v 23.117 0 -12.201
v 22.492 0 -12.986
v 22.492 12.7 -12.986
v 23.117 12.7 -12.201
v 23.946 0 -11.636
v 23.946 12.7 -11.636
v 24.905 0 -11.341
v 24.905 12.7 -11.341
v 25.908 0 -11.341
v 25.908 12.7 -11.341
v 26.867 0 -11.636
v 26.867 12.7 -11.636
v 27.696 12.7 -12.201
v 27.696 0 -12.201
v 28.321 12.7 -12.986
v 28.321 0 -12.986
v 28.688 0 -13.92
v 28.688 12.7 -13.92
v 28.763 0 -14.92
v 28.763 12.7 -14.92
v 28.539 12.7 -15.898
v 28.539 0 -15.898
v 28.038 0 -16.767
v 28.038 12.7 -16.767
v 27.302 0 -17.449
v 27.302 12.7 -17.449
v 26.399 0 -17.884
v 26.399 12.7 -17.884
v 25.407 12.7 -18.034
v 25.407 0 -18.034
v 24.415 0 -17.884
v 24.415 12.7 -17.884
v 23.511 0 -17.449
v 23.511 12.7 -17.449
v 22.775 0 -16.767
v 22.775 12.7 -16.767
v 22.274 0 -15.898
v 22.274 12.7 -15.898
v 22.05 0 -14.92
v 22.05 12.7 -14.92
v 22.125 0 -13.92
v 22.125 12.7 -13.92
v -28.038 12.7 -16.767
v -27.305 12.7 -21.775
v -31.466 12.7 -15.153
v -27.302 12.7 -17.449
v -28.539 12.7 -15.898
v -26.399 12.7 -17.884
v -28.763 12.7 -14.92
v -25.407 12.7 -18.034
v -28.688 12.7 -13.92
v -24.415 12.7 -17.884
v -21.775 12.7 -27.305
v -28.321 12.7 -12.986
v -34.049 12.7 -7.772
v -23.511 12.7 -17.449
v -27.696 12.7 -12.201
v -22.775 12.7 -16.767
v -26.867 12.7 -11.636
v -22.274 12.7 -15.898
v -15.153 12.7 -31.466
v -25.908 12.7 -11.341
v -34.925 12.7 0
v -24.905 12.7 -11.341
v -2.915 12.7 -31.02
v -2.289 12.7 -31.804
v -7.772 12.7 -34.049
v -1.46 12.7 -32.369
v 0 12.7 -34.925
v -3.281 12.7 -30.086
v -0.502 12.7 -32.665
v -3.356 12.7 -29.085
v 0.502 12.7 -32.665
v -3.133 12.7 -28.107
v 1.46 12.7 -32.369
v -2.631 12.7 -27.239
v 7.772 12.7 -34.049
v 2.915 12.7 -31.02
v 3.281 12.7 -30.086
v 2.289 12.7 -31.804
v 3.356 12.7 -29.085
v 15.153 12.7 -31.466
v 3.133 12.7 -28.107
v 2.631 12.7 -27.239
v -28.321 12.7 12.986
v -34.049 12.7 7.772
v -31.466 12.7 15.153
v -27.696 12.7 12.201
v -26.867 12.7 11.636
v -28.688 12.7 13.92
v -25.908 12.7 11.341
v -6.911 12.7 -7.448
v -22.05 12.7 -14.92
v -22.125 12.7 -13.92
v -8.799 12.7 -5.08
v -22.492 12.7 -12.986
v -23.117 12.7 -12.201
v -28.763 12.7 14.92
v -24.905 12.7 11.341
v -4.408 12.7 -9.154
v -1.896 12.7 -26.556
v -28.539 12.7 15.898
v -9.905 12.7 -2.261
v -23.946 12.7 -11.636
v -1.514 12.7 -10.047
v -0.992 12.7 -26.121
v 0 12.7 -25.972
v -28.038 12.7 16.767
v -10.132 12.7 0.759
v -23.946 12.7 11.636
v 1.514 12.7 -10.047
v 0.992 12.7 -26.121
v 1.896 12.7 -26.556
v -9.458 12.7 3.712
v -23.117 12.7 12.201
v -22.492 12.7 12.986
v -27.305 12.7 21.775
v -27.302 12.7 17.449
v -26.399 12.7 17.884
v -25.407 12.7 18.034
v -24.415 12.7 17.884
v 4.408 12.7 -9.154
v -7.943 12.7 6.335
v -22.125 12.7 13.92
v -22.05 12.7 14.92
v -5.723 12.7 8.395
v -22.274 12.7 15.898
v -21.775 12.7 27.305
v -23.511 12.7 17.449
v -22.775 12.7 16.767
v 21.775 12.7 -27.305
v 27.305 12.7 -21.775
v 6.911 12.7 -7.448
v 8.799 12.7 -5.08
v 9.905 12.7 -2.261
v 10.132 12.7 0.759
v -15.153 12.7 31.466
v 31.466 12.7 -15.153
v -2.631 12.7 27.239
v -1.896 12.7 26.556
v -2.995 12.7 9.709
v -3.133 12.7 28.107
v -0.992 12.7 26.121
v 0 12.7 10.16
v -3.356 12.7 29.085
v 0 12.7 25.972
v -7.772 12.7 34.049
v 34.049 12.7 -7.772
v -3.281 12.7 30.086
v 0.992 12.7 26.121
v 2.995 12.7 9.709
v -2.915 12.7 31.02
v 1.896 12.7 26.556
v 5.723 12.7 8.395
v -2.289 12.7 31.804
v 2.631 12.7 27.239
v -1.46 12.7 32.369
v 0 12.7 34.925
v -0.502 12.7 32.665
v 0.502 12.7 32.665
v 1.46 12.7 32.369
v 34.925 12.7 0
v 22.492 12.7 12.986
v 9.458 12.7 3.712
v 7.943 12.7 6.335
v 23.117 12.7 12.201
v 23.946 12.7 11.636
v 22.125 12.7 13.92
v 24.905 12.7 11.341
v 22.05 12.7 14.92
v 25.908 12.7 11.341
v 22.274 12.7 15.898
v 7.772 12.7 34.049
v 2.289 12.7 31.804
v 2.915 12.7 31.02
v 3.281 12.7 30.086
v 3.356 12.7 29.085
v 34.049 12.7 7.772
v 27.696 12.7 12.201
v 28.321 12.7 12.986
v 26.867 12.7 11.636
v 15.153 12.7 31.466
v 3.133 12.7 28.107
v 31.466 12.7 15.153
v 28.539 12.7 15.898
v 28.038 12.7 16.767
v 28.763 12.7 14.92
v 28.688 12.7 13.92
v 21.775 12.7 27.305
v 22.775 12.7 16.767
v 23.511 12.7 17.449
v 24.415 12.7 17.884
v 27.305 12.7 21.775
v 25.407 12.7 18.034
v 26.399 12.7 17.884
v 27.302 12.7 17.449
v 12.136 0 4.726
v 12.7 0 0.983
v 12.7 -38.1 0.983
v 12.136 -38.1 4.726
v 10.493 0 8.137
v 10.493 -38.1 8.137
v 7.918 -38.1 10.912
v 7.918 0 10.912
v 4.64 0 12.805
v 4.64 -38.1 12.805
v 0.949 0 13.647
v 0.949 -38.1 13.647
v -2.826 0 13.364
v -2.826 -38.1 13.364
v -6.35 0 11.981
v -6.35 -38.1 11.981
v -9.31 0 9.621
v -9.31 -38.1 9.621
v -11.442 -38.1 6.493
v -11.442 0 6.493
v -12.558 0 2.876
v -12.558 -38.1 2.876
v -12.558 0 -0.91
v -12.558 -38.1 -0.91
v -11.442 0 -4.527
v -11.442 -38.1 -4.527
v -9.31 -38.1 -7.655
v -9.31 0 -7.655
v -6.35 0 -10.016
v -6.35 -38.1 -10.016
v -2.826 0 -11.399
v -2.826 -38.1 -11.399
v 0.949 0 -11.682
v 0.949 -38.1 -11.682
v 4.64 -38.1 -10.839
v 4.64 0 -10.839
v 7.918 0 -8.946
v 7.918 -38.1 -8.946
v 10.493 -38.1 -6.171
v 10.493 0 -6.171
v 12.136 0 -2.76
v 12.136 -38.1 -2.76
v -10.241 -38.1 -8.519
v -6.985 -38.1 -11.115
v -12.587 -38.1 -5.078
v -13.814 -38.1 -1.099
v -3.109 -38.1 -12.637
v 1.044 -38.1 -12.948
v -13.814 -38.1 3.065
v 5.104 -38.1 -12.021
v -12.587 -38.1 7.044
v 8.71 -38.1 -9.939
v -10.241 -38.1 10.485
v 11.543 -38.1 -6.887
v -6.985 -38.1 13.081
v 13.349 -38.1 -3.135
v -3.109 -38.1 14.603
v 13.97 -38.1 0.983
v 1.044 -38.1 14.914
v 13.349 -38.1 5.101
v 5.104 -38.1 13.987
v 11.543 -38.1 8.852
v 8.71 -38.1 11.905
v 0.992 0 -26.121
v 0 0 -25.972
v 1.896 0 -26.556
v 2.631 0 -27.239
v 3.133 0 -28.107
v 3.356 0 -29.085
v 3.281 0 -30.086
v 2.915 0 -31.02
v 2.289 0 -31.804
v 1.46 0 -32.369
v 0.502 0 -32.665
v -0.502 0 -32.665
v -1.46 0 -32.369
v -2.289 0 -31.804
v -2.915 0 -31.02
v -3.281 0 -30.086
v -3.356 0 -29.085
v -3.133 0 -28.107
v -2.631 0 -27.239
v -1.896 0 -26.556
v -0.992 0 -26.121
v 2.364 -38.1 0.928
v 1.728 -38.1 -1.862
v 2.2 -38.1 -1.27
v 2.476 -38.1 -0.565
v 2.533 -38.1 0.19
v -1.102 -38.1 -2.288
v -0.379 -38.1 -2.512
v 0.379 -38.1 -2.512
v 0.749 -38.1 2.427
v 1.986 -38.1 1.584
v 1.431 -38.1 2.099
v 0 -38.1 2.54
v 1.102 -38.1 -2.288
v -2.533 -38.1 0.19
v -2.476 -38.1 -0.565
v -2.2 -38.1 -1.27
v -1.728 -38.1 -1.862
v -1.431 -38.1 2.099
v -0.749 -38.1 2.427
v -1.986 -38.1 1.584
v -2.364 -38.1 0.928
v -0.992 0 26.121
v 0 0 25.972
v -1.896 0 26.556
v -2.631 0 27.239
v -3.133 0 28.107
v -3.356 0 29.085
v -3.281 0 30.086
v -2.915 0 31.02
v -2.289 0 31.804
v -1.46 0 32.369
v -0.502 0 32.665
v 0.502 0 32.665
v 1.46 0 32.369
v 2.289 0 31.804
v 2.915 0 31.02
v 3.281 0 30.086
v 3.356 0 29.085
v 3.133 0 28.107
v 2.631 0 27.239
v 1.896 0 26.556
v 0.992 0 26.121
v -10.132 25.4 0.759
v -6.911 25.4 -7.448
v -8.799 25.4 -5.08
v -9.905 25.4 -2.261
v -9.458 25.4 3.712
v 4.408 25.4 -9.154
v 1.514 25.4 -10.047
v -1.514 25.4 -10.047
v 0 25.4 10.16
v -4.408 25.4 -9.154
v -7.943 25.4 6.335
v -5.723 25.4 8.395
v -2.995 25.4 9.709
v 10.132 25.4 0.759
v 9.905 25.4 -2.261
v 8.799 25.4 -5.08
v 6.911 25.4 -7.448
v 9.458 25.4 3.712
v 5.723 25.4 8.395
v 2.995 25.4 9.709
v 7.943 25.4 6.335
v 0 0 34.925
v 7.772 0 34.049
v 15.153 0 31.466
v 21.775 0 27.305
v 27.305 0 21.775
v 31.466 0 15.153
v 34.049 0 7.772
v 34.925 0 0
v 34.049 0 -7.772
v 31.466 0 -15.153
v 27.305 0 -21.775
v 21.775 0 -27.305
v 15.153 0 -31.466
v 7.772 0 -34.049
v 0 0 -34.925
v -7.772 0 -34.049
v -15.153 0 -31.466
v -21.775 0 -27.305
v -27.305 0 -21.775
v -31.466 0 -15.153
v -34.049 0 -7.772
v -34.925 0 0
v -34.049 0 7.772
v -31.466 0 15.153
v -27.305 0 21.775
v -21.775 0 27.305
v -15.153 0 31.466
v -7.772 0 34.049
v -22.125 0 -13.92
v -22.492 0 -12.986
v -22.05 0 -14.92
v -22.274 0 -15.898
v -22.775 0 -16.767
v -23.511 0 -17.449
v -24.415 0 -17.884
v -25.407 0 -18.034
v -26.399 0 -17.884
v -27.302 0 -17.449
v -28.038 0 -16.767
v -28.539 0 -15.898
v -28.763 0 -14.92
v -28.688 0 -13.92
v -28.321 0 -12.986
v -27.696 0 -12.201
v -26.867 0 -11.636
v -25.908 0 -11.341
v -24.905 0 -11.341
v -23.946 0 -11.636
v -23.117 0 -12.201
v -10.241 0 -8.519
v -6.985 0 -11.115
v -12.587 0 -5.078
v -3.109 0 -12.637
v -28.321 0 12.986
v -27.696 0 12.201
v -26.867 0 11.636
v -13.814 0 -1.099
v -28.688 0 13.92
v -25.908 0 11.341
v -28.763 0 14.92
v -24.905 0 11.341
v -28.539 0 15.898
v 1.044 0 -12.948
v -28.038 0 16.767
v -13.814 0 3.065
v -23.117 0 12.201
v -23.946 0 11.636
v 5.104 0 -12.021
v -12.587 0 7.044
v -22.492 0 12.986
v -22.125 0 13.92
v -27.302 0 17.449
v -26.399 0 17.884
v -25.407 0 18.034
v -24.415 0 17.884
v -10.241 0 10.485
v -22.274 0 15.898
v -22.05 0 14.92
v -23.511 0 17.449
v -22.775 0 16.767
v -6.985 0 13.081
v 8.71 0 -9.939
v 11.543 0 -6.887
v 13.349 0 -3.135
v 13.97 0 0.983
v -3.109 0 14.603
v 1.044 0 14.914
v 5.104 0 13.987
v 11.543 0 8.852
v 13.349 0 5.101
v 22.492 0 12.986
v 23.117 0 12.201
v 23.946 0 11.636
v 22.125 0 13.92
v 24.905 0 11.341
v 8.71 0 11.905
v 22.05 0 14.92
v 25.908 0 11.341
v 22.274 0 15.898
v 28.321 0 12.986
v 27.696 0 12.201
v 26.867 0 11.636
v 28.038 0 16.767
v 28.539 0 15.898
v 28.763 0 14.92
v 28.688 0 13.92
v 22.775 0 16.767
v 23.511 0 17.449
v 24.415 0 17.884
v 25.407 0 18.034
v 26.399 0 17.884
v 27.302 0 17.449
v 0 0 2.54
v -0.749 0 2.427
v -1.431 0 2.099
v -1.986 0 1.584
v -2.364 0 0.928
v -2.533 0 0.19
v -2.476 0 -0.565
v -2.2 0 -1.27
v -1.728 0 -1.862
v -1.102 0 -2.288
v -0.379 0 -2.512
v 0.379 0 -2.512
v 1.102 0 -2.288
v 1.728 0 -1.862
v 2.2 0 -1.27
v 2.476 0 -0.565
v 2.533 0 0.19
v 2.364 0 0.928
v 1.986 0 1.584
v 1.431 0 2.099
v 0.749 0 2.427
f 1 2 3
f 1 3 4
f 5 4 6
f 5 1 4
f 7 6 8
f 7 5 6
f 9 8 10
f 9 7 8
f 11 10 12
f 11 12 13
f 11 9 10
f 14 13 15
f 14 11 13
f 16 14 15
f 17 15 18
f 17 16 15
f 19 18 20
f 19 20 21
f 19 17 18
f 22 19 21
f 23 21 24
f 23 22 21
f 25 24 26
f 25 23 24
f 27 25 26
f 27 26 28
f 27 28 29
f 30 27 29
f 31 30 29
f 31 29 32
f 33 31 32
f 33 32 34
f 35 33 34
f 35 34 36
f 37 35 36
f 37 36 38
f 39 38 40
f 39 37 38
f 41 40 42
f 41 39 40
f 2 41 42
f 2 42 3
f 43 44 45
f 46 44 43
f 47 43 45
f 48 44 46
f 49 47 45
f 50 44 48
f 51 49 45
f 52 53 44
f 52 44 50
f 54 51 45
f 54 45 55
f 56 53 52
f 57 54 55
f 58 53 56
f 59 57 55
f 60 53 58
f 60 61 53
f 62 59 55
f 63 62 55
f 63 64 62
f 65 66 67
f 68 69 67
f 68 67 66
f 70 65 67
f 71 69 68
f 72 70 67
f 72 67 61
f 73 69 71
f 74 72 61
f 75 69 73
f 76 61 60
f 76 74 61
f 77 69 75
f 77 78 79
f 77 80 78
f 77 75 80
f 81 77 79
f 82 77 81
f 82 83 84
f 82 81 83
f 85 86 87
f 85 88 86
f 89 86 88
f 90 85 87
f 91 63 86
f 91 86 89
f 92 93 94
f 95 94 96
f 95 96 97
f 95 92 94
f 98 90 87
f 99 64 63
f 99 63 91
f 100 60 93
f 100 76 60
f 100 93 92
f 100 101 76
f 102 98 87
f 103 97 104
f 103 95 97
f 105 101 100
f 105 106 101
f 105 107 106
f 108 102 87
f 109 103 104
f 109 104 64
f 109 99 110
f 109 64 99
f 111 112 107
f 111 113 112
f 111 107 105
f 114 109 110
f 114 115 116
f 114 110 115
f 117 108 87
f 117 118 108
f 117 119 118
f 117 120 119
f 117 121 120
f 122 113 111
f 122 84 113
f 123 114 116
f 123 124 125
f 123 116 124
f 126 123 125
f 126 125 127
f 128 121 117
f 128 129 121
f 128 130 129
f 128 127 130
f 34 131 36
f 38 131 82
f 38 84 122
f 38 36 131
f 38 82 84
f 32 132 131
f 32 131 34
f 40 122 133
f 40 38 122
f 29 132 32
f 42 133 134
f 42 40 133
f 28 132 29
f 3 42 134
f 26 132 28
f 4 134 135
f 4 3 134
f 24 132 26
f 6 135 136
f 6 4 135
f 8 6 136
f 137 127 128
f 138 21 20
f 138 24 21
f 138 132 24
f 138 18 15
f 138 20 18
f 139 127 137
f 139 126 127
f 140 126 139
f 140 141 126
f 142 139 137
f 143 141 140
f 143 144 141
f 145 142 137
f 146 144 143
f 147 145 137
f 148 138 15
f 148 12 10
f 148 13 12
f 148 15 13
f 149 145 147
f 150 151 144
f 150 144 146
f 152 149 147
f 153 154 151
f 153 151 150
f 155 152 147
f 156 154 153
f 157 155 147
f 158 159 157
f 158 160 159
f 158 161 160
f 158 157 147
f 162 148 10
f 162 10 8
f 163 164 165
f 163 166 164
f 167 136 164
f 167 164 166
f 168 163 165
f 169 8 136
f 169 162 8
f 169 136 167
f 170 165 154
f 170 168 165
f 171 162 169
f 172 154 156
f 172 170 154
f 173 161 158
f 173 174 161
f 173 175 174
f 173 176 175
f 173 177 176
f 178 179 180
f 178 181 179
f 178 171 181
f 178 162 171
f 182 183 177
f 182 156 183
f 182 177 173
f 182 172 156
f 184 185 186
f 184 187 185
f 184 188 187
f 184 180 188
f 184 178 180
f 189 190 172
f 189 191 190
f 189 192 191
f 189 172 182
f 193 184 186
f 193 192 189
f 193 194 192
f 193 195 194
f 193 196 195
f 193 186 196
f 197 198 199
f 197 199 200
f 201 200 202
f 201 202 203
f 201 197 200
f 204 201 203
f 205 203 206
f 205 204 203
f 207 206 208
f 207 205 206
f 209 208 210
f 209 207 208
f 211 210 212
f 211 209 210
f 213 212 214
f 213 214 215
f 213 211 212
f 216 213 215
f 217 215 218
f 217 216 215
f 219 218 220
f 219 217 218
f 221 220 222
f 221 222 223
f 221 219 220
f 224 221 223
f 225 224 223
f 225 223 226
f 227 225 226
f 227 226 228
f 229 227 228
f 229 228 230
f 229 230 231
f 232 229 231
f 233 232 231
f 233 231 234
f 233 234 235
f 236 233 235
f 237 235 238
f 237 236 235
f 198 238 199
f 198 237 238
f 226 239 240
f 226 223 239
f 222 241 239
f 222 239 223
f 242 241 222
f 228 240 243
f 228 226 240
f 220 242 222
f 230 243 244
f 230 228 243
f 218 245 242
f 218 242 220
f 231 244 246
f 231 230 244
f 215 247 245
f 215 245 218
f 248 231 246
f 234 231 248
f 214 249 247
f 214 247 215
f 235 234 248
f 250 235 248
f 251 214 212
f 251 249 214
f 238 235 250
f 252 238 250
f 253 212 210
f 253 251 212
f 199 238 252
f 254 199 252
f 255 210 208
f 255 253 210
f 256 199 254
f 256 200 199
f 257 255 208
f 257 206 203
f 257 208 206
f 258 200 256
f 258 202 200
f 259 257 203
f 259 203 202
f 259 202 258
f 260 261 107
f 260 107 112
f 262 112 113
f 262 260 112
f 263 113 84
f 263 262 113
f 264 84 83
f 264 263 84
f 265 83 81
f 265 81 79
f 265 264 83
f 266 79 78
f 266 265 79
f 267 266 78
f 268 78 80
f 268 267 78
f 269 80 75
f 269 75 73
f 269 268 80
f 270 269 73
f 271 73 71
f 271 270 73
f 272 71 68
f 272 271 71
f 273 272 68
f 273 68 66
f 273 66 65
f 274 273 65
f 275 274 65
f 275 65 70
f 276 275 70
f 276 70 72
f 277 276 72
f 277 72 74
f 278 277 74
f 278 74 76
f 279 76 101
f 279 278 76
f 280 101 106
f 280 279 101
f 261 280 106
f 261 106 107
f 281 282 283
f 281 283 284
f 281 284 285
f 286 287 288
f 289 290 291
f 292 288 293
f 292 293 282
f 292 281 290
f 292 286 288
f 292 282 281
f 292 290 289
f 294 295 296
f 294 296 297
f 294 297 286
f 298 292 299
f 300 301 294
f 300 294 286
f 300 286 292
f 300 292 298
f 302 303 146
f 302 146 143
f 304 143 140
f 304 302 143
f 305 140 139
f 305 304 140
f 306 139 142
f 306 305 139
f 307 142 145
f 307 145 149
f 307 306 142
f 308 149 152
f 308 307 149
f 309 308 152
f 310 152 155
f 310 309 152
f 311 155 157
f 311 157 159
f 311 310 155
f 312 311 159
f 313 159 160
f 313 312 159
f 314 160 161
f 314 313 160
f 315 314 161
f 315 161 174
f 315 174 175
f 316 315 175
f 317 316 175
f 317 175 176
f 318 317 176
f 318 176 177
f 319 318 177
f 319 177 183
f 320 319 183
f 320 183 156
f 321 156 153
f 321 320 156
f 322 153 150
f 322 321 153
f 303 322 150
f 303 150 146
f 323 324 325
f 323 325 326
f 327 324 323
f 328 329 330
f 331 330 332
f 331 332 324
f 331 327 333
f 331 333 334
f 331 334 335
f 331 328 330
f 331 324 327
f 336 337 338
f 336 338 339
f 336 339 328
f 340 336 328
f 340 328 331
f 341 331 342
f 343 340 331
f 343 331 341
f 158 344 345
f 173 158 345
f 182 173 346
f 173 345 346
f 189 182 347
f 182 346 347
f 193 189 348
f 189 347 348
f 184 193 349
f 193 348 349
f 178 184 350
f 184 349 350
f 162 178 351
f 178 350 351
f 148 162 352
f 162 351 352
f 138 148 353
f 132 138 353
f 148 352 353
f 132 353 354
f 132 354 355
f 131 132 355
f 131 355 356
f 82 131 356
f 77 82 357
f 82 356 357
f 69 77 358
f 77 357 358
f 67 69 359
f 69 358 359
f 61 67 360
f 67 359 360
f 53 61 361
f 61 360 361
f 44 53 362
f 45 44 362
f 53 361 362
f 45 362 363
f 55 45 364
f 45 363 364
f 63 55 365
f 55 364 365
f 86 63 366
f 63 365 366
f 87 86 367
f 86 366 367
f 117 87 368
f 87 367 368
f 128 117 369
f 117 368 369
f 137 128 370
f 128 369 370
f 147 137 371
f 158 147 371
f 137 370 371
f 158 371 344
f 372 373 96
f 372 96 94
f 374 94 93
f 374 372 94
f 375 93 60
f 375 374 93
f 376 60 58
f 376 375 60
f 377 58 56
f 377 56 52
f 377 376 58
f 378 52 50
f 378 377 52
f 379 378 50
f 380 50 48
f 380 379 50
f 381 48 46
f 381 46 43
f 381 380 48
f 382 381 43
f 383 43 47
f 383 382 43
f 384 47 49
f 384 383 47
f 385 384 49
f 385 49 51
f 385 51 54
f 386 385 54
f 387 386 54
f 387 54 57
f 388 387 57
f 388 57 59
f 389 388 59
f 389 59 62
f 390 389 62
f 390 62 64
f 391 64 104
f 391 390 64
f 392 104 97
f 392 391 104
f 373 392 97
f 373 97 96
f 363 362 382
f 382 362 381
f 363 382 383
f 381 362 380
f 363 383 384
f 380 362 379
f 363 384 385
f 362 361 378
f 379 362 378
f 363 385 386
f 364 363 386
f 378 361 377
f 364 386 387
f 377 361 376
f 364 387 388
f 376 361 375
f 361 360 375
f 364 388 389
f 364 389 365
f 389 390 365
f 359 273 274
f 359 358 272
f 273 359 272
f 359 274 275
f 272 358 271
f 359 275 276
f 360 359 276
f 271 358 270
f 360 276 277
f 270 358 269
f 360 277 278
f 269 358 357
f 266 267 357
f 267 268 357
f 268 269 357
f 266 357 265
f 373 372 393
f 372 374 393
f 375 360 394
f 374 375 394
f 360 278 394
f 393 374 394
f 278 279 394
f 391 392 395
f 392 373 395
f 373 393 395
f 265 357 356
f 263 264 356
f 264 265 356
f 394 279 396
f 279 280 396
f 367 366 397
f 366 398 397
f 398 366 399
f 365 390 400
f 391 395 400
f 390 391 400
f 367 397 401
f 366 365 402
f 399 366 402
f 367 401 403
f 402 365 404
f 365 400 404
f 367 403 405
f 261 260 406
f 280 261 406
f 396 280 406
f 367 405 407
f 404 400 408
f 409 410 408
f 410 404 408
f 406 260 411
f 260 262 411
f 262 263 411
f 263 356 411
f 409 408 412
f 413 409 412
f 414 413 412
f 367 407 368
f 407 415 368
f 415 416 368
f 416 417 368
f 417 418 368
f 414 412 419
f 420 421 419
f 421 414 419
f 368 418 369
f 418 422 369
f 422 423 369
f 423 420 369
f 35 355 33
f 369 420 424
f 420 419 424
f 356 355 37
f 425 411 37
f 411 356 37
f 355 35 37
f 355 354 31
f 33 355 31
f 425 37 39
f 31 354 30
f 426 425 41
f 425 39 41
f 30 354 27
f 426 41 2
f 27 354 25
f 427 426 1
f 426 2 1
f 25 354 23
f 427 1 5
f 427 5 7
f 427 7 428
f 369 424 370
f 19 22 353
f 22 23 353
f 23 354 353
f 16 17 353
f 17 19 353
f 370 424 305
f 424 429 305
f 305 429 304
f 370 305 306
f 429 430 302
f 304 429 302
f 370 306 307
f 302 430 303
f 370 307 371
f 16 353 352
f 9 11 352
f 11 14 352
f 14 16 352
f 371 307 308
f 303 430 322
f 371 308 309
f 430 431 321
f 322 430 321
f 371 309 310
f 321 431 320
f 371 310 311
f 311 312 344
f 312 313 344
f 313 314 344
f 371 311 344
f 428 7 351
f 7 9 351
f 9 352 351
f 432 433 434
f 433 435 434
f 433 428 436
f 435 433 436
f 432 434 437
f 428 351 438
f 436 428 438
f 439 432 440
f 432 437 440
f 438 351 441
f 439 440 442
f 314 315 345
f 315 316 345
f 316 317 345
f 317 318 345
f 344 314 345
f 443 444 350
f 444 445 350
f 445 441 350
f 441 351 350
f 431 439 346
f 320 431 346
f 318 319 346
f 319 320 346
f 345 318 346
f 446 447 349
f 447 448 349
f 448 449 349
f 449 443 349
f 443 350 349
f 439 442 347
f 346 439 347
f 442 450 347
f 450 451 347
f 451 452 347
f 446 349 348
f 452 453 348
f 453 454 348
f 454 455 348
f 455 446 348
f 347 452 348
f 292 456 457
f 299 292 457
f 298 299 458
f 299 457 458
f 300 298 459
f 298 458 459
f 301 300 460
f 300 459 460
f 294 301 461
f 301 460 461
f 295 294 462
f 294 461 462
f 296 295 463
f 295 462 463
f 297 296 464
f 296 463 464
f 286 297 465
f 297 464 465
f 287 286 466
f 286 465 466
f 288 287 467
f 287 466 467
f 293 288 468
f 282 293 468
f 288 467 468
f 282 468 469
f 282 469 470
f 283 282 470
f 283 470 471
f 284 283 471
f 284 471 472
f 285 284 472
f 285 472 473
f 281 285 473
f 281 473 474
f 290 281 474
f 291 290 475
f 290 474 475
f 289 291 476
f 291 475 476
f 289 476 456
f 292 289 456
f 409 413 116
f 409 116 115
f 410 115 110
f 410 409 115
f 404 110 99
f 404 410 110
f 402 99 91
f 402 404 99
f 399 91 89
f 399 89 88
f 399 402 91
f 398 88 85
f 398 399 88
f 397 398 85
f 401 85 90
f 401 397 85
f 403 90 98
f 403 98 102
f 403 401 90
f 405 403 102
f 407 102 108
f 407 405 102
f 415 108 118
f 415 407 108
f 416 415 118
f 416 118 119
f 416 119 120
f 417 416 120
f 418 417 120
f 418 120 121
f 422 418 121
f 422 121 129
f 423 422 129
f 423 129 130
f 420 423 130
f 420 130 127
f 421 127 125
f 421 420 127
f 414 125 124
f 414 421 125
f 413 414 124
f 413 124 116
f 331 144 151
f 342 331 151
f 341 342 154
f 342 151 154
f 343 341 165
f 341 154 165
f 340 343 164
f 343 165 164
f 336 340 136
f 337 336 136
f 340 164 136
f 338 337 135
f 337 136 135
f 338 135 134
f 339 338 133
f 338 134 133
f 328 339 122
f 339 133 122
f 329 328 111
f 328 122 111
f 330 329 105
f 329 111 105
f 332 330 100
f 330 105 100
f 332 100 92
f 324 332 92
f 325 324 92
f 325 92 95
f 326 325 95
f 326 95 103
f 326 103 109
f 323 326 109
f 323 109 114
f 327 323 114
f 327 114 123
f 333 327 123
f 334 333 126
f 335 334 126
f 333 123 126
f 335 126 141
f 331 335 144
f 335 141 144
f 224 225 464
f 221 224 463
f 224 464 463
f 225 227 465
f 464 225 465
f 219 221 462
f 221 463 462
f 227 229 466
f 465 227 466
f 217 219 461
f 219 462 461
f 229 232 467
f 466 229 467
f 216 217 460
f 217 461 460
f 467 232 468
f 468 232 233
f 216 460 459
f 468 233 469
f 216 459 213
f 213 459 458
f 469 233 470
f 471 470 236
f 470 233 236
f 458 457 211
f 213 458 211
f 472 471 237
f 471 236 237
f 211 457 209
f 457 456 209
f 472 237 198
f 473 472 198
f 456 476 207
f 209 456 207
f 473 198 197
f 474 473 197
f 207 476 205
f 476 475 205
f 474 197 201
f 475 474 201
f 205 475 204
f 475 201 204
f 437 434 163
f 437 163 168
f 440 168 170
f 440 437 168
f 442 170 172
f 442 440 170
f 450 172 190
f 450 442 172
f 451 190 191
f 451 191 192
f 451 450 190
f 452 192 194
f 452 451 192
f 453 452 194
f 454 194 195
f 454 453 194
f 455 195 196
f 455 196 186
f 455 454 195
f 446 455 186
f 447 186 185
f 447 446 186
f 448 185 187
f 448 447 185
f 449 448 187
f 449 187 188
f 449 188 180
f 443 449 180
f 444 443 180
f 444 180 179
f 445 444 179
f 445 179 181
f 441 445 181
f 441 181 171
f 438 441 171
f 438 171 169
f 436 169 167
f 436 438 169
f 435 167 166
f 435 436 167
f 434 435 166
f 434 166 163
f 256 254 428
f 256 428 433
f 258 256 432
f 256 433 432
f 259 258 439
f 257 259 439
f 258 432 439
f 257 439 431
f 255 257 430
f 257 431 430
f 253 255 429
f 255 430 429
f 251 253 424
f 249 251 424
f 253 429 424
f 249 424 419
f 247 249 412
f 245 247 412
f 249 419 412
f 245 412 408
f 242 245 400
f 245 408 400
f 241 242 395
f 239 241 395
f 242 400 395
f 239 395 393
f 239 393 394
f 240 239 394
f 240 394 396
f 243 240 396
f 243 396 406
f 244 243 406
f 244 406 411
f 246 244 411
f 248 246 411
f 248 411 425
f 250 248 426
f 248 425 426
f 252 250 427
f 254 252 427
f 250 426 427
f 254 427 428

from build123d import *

# Parameters (mm, degrees)
SKETCH1_R           = 34.925
EXTRUDE1_DEPTH      = 12.7
SKETCH3_R           = 3.3655
CUT_EXTRUDE2_DEPTH  = 12.7
CIRPATTERN1_COUNT   = 6
SKETCH6_R           = 10.16
EXTRUDE2_DEPTH      = 12.7
SKETCH7_R           = 13.97
SKETCH7_R_2         = 12.7
EXTRUDE_THIN2_DEPTH = 38.1
SKETCH8_R           = 2.54
EXTRUDE4_DEPTH      = 38.1


with BuildPart() as part:
    # Sketch1 → Extrude1 (new body)
    with BuildSketch(Plane(origin=(0, 0, 0), x_dir=(1, 0, 0), z_dir=(0, 1, 0))):
        Circle(SKETCH1_R)
    extrude(amount=EXTRUDE1_DEPTH)

    # Sketch3 → Cut-Extrude2 (cut)
    with BuildSketch(Plane(origin=(0, 0, 0), x_dir=(1, 0, 0), z_dir=(0, 1, 0))):
        with Locations((0, 29.337)):
            Circle(SKETCH3_R)
    cut_extrude2 = extrude(amount=CUT_EXTRUDE2_DEPTH, mode=Mode.SUBTRACT)

    # CirPattern1: Cut-Extrude2 ×6 about axis
    cirpattern1_axis = Axis((0, 35.858162691, 0), (0, -1, 0))
    for i in range(1, CIRPATTERN1_COUNT):
        add(cut_extrude2.rotate(cirpattern1_axis, i * 360 / CIRPATTERN1_COUNT), mode=Mode.SUBTRACT)

    # Sketch6 → Extrude2 (add)
    with BuildSketch(Plane(origin=(0, 12.7, 0), x_dir=(-1, 0, 0), z_dir=(0, 1, 0))):
        Circle(SKETCH6_R)
    extrude(amount=EXTRUDE2_DEPTH)

    # Sketch7 → Extrude-Thin2 (add)
    with BuildSketch(Plane.XZ):
        with Locations((0, 0.982903874)):
            Circle(SKETCH7_R)
        with Locations((0, 0.982903874)):
            Circle(SKETCH7_R_2, mode=Mode.SUBTRACT)
    extrude(amount=EXTRUDE_THIN2_DEPTH)

    # Sketch8 → Extrude4 (add)
    with BuildSketch(Plane.XZ):
        Circle(SKETCH8_R)
    extrude(amount=EXTRUDE4_DEPTH)


solid = part.part
